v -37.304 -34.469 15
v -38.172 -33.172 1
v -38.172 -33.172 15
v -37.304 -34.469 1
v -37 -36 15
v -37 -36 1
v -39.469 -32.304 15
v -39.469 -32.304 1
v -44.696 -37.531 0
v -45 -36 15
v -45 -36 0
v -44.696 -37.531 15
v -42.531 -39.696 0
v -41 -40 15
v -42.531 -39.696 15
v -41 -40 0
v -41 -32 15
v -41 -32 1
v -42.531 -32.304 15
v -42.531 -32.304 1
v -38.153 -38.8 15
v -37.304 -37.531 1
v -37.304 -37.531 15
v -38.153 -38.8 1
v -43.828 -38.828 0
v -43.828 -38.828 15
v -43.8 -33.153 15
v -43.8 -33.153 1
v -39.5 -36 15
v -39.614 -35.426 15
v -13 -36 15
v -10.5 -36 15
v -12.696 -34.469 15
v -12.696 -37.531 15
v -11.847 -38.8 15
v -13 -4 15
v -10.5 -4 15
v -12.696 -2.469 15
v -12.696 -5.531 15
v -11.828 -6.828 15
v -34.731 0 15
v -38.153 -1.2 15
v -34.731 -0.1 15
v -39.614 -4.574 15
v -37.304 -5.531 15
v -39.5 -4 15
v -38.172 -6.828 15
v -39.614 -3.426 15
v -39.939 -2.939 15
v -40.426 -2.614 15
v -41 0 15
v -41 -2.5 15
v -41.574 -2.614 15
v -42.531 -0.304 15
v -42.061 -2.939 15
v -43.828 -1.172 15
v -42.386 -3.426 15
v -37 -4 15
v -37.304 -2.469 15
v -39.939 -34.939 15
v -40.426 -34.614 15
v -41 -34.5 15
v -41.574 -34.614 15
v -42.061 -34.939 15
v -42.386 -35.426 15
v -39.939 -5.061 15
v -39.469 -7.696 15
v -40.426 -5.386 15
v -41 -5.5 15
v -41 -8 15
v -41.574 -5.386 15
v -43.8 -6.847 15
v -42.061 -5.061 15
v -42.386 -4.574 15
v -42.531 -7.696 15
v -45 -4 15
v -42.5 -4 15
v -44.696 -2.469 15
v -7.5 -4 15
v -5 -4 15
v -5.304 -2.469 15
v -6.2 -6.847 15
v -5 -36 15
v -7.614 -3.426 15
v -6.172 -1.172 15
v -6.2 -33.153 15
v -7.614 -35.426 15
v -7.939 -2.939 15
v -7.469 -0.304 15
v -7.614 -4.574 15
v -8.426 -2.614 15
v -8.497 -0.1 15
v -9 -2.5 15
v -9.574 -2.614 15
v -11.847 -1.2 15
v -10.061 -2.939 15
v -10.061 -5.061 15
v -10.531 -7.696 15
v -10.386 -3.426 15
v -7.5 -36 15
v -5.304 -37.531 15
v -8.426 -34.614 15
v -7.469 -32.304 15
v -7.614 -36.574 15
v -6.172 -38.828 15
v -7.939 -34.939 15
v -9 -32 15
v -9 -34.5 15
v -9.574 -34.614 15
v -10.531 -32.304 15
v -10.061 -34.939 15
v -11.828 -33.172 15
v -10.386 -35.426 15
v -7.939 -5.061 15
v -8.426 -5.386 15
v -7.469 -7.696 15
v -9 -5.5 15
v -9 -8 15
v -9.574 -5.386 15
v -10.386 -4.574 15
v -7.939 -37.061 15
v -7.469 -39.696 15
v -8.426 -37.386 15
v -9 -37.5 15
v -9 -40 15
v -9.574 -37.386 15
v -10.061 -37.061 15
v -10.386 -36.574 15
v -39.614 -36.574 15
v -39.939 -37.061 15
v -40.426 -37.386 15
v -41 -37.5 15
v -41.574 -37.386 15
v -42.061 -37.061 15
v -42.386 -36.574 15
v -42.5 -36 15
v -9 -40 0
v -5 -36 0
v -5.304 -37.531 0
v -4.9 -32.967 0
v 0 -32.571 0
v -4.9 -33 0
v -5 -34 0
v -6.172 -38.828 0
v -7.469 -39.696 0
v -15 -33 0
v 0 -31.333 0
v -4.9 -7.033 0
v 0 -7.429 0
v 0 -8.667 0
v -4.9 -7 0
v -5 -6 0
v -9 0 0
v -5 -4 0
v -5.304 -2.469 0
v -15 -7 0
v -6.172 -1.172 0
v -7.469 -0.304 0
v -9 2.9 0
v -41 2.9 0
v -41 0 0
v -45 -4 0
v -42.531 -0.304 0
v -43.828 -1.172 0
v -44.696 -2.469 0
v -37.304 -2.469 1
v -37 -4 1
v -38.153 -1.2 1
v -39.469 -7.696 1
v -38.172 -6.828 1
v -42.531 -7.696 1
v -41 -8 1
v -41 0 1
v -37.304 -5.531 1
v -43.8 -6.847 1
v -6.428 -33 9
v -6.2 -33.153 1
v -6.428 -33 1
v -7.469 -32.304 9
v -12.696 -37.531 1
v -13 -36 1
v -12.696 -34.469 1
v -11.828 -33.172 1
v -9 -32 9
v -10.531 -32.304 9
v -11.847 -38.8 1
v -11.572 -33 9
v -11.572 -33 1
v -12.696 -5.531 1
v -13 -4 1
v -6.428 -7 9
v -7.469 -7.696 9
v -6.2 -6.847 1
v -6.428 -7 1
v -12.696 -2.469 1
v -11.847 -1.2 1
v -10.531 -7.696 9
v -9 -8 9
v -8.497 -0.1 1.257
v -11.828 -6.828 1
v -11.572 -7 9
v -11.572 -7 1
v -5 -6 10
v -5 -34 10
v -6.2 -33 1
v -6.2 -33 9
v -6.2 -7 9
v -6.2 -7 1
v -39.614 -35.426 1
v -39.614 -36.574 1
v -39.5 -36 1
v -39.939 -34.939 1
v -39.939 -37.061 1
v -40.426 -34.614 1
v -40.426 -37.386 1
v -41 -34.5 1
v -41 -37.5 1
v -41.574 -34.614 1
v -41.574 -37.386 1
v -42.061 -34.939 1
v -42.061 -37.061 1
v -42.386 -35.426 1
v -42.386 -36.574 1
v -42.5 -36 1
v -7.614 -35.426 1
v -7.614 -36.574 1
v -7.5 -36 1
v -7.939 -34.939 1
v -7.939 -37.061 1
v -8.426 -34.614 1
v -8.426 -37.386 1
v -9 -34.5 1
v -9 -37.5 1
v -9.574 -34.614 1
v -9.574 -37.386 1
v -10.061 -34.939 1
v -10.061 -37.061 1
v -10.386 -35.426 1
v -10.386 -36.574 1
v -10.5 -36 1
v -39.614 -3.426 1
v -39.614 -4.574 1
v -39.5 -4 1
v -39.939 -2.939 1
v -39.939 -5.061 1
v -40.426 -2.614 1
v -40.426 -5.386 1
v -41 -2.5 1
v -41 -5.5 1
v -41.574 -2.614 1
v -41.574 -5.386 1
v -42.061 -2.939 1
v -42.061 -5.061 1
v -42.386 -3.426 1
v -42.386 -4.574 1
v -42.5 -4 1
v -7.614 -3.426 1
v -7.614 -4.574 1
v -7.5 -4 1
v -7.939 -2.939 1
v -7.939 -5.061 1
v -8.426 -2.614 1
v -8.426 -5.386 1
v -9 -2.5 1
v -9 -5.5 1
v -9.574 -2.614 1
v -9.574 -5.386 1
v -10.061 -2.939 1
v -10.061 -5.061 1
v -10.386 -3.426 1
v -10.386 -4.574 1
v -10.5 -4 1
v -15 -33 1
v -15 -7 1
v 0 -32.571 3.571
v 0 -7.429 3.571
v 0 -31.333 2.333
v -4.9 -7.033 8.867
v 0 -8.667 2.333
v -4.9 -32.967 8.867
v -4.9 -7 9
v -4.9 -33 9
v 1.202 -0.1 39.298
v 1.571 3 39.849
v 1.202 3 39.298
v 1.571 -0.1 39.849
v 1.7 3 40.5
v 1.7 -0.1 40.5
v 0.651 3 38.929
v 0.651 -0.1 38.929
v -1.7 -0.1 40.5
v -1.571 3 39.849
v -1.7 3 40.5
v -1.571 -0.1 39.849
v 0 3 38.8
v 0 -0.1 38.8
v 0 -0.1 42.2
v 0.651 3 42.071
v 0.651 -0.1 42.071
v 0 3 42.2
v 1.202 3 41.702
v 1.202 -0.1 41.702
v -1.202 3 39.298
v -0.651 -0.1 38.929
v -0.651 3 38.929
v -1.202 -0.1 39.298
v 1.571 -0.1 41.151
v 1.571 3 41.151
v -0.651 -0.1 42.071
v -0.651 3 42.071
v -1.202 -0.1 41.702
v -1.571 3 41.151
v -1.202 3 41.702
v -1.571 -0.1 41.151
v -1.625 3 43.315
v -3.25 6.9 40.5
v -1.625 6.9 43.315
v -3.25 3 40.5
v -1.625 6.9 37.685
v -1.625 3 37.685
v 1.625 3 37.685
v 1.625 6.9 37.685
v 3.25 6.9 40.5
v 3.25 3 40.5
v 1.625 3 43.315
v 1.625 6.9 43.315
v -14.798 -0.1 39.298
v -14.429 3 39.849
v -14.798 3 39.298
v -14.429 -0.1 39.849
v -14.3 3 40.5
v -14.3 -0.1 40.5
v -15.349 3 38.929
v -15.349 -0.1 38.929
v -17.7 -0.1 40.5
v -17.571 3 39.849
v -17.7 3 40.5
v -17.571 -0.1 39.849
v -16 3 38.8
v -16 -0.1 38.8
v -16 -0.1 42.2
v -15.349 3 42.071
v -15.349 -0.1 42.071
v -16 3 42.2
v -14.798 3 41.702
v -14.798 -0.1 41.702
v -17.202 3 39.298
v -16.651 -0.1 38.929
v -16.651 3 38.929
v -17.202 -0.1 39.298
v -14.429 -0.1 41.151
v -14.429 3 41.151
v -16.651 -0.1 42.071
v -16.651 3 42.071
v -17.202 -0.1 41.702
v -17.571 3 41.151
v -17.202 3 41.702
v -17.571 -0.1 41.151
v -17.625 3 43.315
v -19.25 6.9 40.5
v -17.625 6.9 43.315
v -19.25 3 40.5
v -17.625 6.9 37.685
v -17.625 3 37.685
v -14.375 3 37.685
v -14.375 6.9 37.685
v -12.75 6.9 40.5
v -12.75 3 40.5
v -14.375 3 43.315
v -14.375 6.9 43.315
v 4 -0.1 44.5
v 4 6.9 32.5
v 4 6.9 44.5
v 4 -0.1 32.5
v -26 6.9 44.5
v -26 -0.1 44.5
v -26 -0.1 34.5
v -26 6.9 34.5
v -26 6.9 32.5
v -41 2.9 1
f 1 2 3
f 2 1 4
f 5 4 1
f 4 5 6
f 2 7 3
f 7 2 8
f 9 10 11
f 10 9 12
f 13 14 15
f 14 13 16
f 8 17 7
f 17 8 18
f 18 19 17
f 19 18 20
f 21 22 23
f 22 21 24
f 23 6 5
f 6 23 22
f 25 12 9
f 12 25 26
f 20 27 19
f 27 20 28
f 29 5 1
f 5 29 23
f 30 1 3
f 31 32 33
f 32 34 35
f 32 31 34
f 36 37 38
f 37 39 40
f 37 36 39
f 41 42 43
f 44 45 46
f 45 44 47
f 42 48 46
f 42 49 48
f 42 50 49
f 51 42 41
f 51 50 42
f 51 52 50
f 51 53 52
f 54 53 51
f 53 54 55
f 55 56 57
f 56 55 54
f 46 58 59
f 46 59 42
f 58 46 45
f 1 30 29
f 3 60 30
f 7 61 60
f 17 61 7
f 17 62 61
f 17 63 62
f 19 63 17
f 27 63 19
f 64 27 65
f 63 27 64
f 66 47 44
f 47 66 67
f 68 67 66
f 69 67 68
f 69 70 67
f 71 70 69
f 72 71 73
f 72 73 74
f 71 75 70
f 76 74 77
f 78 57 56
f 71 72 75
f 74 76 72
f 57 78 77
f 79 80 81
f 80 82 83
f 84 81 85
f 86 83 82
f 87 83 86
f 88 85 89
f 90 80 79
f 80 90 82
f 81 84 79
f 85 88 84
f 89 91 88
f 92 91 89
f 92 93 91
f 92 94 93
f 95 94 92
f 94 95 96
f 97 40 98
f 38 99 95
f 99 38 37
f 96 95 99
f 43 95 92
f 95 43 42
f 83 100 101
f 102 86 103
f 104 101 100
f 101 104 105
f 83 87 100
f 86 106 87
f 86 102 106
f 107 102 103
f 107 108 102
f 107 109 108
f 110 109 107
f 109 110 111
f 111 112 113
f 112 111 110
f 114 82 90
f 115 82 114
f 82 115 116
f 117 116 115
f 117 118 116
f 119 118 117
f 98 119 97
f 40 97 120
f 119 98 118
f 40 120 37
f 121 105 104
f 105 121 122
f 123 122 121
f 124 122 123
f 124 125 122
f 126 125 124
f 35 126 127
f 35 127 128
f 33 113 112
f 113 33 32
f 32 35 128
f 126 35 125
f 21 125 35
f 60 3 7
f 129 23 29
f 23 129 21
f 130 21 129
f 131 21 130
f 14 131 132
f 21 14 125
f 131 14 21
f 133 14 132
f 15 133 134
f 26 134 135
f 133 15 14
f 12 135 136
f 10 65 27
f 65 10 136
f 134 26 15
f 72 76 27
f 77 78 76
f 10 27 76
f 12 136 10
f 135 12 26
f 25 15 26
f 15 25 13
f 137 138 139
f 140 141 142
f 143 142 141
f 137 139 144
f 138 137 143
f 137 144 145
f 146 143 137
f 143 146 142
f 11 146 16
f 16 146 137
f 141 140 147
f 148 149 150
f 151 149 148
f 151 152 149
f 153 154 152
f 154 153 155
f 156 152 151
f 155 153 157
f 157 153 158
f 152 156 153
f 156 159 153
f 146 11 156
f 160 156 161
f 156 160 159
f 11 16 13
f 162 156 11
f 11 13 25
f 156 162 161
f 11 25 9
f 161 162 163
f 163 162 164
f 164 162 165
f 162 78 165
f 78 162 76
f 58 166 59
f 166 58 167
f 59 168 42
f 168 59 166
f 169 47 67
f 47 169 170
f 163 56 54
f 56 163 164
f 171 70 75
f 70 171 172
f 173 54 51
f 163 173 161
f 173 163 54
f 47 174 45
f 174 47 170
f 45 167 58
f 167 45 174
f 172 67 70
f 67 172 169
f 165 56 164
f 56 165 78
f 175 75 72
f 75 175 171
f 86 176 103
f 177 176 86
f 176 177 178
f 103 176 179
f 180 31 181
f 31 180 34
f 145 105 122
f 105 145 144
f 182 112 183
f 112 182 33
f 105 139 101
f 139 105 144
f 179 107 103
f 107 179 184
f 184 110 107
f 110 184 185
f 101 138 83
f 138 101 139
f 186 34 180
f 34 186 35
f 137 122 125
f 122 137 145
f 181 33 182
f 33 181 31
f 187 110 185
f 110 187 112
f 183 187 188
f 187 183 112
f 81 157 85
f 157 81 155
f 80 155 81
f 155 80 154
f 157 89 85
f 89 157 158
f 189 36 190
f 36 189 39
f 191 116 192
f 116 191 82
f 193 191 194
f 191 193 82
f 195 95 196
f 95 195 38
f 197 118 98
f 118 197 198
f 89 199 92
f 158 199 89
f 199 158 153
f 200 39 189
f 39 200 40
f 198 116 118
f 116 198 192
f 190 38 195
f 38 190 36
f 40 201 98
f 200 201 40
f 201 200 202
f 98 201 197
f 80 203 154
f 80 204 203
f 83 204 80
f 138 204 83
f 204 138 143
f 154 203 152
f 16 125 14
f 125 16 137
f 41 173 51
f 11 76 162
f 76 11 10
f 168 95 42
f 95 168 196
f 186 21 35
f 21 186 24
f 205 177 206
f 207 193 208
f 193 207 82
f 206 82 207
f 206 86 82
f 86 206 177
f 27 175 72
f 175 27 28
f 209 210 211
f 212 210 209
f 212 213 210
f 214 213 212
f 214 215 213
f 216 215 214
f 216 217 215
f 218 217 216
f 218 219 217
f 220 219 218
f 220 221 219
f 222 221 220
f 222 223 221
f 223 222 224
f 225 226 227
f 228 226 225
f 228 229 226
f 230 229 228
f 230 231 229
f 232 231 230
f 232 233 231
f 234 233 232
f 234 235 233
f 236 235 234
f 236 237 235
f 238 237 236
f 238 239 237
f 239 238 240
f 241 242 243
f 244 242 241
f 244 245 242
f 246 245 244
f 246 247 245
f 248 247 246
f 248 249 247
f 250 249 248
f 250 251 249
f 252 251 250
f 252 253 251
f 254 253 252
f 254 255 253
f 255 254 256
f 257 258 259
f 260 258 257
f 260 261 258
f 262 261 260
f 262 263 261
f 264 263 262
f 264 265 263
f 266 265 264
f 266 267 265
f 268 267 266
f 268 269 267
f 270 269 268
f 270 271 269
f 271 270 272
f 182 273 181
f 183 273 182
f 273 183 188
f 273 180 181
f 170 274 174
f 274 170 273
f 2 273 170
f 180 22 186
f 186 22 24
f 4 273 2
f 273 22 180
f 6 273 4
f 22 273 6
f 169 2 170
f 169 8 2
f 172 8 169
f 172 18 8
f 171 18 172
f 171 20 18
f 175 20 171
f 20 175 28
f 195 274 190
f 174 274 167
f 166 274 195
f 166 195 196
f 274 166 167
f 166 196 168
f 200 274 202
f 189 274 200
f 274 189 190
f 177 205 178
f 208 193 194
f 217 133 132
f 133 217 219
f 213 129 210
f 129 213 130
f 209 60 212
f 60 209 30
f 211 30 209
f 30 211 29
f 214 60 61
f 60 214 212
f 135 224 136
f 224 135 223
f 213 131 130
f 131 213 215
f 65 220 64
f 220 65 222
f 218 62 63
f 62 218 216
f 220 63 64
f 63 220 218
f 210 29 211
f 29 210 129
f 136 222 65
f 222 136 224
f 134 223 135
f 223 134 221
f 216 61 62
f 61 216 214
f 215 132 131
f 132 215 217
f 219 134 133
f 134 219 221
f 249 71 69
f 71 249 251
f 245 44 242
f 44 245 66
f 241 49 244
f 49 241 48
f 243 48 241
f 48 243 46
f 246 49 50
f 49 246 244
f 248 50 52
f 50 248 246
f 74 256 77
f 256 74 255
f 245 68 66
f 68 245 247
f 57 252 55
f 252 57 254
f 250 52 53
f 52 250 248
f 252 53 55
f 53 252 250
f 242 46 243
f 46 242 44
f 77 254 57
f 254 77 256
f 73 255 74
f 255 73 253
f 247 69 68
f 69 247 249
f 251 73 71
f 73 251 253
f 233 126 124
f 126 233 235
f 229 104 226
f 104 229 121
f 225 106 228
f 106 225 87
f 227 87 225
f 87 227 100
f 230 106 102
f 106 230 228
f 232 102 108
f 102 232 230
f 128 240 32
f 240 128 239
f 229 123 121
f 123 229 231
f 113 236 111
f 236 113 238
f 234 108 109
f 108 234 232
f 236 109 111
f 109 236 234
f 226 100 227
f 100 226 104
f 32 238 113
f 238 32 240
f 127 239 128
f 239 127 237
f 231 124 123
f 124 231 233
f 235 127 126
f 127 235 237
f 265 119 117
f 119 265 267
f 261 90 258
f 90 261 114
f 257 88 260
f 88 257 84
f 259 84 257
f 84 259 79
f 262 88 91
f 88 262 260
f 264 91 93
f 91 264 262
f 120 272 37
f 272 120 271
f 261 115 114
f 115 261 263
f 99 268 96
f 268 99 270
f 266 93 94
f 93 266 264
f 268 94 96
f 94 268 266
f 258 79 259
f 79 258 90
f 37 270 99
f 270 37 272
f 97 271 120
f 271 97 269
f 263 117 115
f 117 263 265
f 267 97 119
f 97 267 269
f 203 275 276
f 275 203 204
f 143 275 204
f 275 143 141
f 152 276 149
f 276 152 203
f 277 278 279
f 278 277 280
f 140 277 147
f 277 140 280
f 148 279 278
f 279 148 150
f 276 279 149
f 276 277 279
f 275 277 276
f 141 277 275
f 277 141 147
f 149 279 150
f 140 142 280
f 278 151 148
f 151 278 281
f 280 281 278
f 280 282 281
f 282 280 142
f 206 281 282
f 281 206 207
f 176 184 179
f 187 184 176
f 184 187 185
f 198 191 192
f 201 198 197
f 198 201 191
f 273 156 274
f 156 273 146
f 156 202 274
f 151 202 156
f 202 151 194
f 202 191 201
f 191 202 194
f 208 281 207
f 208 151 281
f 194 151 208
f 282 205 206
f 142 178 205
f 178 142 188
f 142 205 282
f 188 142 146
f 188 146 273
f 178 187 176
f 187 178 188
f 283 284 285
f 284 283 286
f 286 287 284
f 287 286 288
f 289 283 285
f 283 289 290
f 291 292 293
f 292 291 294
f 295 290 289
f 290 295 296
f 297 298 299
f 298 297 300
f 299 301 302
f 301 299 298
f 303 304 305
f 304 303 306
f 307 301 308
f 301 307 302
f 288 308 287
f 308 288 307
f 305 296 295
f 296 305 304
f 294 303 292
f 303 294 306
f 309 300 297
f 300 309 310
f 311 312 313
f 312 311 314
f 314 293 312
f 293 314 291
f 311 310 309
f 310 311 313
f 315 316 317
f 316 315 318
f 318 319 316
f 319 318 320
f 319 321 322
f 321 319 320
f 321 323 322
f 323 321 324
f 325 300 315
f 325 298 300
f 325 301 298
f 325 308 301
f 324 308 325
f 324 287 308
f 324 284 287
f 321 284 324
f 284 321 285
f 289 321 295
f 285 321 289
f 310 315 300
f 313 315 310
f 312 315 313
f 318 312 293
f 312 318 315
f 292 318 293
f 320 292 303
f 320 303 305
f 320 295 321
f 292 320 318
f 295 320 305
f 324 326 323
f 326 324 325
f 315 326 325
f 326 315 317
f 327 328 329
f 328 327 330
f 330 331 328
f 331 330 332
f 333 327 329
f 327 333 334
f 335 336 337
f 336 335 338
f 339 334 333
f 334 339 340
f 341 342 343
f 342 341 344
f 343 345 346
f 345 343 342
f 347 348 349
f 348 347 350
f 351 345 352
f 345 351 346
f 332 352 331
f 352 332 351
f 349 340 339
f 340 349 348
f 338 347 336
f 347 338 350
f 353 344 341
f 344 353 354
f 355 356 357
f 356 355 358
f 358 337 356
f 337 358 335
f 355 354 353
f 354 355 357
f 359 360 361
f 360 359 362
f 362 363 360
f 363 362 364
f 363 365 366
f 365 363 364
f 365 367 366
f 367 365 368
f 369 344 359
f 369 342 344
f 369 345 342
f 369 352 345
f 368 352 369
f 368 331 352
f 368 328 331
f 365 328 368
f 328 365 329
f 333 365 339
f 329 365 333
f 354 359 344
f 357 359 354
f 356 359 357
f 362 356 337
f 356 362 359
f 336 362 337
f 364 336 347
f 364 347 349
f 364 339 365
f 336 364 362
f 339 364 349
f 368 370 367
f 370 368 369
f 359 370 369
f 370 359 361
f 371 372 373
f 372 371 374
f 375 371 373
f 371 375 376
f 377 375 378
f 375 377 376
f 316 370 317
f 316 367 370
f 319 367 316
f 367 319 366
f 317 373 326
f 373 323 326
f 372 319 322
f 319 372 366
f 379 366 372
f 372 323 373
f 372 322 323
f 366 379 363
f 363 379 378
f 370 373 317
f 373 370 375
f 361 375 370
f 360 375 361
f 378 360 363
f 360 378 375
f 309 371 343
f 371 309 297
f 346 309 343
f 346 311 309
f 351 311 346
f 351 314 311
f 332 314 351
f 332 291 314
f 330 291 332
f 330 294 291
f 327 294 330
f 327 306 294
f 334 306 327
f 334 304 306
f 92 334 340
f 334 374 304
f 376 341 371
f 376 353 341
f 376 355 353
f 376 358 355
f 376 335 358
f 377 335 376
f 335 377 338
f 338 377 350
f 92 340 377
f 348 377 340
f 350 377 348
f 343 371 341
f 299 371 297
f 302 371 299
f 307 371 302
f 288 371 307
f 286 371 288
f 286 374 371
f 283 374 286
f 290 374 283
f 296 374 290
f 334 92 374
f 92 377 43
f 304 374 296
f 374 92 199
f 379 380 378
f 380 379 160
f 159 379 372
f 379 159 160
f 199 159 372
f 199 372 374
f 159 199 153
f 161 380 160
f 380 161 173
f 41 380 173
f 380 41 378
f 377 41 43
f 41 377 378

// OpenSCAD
$fn=16;

// copy-paste from xcarrige.scad
mgn12h=[46,27,13];  // carrige sizes
titan_cogwheel_at_baseheight_from_bottom=26;
nema_bottom_space=mgn12h[1]-titan_cogwheel_at_baseheight_from_bottom;

motor_plate_width=2.0;
motor_plate_start=mgn12h[0]/2-10+5;//motor_plate_width-3.5;
// copy-paste end

e3d_h=65.5;
titan_e3d_offset=13;

mount_holes_distance=16;
mount_hole_0_x=(4+mount_holes_distance) - (motor_plate_start+motor_plate_width);
mount_hole_1_x=mount_hole_0_x-mount_holes_distance;
mount_holes_to_motor=8;
mount_holes_to_tip=e3d_h-titan_e3d_offset-mount_holes_to_motor;
mount_holes_to_bottom=mount_holes_to_tip-4;
mount_width_from_hole_0=26;

fan_w=40;
fan_holes=32;

blower_width=5;
blower_height=10;

module base(h=15) {
    rr=(fan_w-fan_holes)/2;
    cc=[rr,fan_w-rr];
 
    difference() {
        hull() {
            for (x=cc,y=cc) translate([x,y,0]) cylinder(r=rr,h=h);
        }
        hull() {
            for (x=cc,y=cc) translate([x,y,1]) cylinder(r=rr-1.2,h=h);
        }
    }
    
    difference() {
        for (x=cc,y=cc) translate([x,y,0]) cylinder(r=rr,h=h);
        for (x=cc,y=cc) translate([x,y,1]) cylinder(d=3, h=h);
    }

}

module duct() {
    
    intersection() {
        difference() {
            hull() {
                translate([-1,-fan_holes/2+2,0]) cube([1,fan_holes-4,blower_height]);
                translate([blower_width+1,-fan_holes/2+4,0]) cube([1,fan_holes-8,1]);
            }
            hull() {
                translate([-2,-fan_holes/2+3,-1]) cube([2,fan_holes-6,blower_height]);
                translate([blower_width,-fan_holes/2+5,0]) cube([1,fan_holes-10,1]);
            }
        }
        
        translate([-1,-fan_holes/2+2,0]) cube([1+blower_width,fan_holes-4,blower_height]);
    }
}

module blower() {
    rr=(fan_w-fan_holes)/2;
    difference() {
        union() {
            base();
            translate([fan_w,fan_w/2,0]) duct();
        }
        
        ww=10;
        translate([fan_w-ww,rr+3,-1]) cube([ww+0.1,fan_holes-6,blower_height]);
    }
}


module nut3(h=4) {
    hull() {
        for (r=[0:60:300]) rotate([0,0,r]) translate([3.2,0,0]) cylinder(d=0.1,h=h, $fn=2);
    }
}


module blower_with_mount() {
    translate([-fan_w-blower_width,-fan_w,0]) blower();
    difference() {
        translate([mount_hole_0_x-mount_width_from_hole_0,-0.1,mount_holes_to_bottom-7])
            cube([mount_width_from_hole_0+4,7,11]);
        
        for (hole=[mount_hole_0_x,mount_hole_1_x]) {
            translate([hole,-1,mount_holes_to_bottom]) rotate([-90,0,0]) {
                cylinder(d=3.4,h=10);
                translate([0,0,4]) nut3();
            }
        }
    }
    hull() {
        translate([mount_hole_0_x-mount_width_from_hole_0,-0.1,mount_holes_to_bottom-8])
            cube([mount_width_from_hole_0+4,7,2]);
        translate([-blower_width-fan_w+4,-0.1,0]) cube([fan_w-8,3,1]);
    }
}

echo(mount_holes_to_bottom);
blower_with_mount();
